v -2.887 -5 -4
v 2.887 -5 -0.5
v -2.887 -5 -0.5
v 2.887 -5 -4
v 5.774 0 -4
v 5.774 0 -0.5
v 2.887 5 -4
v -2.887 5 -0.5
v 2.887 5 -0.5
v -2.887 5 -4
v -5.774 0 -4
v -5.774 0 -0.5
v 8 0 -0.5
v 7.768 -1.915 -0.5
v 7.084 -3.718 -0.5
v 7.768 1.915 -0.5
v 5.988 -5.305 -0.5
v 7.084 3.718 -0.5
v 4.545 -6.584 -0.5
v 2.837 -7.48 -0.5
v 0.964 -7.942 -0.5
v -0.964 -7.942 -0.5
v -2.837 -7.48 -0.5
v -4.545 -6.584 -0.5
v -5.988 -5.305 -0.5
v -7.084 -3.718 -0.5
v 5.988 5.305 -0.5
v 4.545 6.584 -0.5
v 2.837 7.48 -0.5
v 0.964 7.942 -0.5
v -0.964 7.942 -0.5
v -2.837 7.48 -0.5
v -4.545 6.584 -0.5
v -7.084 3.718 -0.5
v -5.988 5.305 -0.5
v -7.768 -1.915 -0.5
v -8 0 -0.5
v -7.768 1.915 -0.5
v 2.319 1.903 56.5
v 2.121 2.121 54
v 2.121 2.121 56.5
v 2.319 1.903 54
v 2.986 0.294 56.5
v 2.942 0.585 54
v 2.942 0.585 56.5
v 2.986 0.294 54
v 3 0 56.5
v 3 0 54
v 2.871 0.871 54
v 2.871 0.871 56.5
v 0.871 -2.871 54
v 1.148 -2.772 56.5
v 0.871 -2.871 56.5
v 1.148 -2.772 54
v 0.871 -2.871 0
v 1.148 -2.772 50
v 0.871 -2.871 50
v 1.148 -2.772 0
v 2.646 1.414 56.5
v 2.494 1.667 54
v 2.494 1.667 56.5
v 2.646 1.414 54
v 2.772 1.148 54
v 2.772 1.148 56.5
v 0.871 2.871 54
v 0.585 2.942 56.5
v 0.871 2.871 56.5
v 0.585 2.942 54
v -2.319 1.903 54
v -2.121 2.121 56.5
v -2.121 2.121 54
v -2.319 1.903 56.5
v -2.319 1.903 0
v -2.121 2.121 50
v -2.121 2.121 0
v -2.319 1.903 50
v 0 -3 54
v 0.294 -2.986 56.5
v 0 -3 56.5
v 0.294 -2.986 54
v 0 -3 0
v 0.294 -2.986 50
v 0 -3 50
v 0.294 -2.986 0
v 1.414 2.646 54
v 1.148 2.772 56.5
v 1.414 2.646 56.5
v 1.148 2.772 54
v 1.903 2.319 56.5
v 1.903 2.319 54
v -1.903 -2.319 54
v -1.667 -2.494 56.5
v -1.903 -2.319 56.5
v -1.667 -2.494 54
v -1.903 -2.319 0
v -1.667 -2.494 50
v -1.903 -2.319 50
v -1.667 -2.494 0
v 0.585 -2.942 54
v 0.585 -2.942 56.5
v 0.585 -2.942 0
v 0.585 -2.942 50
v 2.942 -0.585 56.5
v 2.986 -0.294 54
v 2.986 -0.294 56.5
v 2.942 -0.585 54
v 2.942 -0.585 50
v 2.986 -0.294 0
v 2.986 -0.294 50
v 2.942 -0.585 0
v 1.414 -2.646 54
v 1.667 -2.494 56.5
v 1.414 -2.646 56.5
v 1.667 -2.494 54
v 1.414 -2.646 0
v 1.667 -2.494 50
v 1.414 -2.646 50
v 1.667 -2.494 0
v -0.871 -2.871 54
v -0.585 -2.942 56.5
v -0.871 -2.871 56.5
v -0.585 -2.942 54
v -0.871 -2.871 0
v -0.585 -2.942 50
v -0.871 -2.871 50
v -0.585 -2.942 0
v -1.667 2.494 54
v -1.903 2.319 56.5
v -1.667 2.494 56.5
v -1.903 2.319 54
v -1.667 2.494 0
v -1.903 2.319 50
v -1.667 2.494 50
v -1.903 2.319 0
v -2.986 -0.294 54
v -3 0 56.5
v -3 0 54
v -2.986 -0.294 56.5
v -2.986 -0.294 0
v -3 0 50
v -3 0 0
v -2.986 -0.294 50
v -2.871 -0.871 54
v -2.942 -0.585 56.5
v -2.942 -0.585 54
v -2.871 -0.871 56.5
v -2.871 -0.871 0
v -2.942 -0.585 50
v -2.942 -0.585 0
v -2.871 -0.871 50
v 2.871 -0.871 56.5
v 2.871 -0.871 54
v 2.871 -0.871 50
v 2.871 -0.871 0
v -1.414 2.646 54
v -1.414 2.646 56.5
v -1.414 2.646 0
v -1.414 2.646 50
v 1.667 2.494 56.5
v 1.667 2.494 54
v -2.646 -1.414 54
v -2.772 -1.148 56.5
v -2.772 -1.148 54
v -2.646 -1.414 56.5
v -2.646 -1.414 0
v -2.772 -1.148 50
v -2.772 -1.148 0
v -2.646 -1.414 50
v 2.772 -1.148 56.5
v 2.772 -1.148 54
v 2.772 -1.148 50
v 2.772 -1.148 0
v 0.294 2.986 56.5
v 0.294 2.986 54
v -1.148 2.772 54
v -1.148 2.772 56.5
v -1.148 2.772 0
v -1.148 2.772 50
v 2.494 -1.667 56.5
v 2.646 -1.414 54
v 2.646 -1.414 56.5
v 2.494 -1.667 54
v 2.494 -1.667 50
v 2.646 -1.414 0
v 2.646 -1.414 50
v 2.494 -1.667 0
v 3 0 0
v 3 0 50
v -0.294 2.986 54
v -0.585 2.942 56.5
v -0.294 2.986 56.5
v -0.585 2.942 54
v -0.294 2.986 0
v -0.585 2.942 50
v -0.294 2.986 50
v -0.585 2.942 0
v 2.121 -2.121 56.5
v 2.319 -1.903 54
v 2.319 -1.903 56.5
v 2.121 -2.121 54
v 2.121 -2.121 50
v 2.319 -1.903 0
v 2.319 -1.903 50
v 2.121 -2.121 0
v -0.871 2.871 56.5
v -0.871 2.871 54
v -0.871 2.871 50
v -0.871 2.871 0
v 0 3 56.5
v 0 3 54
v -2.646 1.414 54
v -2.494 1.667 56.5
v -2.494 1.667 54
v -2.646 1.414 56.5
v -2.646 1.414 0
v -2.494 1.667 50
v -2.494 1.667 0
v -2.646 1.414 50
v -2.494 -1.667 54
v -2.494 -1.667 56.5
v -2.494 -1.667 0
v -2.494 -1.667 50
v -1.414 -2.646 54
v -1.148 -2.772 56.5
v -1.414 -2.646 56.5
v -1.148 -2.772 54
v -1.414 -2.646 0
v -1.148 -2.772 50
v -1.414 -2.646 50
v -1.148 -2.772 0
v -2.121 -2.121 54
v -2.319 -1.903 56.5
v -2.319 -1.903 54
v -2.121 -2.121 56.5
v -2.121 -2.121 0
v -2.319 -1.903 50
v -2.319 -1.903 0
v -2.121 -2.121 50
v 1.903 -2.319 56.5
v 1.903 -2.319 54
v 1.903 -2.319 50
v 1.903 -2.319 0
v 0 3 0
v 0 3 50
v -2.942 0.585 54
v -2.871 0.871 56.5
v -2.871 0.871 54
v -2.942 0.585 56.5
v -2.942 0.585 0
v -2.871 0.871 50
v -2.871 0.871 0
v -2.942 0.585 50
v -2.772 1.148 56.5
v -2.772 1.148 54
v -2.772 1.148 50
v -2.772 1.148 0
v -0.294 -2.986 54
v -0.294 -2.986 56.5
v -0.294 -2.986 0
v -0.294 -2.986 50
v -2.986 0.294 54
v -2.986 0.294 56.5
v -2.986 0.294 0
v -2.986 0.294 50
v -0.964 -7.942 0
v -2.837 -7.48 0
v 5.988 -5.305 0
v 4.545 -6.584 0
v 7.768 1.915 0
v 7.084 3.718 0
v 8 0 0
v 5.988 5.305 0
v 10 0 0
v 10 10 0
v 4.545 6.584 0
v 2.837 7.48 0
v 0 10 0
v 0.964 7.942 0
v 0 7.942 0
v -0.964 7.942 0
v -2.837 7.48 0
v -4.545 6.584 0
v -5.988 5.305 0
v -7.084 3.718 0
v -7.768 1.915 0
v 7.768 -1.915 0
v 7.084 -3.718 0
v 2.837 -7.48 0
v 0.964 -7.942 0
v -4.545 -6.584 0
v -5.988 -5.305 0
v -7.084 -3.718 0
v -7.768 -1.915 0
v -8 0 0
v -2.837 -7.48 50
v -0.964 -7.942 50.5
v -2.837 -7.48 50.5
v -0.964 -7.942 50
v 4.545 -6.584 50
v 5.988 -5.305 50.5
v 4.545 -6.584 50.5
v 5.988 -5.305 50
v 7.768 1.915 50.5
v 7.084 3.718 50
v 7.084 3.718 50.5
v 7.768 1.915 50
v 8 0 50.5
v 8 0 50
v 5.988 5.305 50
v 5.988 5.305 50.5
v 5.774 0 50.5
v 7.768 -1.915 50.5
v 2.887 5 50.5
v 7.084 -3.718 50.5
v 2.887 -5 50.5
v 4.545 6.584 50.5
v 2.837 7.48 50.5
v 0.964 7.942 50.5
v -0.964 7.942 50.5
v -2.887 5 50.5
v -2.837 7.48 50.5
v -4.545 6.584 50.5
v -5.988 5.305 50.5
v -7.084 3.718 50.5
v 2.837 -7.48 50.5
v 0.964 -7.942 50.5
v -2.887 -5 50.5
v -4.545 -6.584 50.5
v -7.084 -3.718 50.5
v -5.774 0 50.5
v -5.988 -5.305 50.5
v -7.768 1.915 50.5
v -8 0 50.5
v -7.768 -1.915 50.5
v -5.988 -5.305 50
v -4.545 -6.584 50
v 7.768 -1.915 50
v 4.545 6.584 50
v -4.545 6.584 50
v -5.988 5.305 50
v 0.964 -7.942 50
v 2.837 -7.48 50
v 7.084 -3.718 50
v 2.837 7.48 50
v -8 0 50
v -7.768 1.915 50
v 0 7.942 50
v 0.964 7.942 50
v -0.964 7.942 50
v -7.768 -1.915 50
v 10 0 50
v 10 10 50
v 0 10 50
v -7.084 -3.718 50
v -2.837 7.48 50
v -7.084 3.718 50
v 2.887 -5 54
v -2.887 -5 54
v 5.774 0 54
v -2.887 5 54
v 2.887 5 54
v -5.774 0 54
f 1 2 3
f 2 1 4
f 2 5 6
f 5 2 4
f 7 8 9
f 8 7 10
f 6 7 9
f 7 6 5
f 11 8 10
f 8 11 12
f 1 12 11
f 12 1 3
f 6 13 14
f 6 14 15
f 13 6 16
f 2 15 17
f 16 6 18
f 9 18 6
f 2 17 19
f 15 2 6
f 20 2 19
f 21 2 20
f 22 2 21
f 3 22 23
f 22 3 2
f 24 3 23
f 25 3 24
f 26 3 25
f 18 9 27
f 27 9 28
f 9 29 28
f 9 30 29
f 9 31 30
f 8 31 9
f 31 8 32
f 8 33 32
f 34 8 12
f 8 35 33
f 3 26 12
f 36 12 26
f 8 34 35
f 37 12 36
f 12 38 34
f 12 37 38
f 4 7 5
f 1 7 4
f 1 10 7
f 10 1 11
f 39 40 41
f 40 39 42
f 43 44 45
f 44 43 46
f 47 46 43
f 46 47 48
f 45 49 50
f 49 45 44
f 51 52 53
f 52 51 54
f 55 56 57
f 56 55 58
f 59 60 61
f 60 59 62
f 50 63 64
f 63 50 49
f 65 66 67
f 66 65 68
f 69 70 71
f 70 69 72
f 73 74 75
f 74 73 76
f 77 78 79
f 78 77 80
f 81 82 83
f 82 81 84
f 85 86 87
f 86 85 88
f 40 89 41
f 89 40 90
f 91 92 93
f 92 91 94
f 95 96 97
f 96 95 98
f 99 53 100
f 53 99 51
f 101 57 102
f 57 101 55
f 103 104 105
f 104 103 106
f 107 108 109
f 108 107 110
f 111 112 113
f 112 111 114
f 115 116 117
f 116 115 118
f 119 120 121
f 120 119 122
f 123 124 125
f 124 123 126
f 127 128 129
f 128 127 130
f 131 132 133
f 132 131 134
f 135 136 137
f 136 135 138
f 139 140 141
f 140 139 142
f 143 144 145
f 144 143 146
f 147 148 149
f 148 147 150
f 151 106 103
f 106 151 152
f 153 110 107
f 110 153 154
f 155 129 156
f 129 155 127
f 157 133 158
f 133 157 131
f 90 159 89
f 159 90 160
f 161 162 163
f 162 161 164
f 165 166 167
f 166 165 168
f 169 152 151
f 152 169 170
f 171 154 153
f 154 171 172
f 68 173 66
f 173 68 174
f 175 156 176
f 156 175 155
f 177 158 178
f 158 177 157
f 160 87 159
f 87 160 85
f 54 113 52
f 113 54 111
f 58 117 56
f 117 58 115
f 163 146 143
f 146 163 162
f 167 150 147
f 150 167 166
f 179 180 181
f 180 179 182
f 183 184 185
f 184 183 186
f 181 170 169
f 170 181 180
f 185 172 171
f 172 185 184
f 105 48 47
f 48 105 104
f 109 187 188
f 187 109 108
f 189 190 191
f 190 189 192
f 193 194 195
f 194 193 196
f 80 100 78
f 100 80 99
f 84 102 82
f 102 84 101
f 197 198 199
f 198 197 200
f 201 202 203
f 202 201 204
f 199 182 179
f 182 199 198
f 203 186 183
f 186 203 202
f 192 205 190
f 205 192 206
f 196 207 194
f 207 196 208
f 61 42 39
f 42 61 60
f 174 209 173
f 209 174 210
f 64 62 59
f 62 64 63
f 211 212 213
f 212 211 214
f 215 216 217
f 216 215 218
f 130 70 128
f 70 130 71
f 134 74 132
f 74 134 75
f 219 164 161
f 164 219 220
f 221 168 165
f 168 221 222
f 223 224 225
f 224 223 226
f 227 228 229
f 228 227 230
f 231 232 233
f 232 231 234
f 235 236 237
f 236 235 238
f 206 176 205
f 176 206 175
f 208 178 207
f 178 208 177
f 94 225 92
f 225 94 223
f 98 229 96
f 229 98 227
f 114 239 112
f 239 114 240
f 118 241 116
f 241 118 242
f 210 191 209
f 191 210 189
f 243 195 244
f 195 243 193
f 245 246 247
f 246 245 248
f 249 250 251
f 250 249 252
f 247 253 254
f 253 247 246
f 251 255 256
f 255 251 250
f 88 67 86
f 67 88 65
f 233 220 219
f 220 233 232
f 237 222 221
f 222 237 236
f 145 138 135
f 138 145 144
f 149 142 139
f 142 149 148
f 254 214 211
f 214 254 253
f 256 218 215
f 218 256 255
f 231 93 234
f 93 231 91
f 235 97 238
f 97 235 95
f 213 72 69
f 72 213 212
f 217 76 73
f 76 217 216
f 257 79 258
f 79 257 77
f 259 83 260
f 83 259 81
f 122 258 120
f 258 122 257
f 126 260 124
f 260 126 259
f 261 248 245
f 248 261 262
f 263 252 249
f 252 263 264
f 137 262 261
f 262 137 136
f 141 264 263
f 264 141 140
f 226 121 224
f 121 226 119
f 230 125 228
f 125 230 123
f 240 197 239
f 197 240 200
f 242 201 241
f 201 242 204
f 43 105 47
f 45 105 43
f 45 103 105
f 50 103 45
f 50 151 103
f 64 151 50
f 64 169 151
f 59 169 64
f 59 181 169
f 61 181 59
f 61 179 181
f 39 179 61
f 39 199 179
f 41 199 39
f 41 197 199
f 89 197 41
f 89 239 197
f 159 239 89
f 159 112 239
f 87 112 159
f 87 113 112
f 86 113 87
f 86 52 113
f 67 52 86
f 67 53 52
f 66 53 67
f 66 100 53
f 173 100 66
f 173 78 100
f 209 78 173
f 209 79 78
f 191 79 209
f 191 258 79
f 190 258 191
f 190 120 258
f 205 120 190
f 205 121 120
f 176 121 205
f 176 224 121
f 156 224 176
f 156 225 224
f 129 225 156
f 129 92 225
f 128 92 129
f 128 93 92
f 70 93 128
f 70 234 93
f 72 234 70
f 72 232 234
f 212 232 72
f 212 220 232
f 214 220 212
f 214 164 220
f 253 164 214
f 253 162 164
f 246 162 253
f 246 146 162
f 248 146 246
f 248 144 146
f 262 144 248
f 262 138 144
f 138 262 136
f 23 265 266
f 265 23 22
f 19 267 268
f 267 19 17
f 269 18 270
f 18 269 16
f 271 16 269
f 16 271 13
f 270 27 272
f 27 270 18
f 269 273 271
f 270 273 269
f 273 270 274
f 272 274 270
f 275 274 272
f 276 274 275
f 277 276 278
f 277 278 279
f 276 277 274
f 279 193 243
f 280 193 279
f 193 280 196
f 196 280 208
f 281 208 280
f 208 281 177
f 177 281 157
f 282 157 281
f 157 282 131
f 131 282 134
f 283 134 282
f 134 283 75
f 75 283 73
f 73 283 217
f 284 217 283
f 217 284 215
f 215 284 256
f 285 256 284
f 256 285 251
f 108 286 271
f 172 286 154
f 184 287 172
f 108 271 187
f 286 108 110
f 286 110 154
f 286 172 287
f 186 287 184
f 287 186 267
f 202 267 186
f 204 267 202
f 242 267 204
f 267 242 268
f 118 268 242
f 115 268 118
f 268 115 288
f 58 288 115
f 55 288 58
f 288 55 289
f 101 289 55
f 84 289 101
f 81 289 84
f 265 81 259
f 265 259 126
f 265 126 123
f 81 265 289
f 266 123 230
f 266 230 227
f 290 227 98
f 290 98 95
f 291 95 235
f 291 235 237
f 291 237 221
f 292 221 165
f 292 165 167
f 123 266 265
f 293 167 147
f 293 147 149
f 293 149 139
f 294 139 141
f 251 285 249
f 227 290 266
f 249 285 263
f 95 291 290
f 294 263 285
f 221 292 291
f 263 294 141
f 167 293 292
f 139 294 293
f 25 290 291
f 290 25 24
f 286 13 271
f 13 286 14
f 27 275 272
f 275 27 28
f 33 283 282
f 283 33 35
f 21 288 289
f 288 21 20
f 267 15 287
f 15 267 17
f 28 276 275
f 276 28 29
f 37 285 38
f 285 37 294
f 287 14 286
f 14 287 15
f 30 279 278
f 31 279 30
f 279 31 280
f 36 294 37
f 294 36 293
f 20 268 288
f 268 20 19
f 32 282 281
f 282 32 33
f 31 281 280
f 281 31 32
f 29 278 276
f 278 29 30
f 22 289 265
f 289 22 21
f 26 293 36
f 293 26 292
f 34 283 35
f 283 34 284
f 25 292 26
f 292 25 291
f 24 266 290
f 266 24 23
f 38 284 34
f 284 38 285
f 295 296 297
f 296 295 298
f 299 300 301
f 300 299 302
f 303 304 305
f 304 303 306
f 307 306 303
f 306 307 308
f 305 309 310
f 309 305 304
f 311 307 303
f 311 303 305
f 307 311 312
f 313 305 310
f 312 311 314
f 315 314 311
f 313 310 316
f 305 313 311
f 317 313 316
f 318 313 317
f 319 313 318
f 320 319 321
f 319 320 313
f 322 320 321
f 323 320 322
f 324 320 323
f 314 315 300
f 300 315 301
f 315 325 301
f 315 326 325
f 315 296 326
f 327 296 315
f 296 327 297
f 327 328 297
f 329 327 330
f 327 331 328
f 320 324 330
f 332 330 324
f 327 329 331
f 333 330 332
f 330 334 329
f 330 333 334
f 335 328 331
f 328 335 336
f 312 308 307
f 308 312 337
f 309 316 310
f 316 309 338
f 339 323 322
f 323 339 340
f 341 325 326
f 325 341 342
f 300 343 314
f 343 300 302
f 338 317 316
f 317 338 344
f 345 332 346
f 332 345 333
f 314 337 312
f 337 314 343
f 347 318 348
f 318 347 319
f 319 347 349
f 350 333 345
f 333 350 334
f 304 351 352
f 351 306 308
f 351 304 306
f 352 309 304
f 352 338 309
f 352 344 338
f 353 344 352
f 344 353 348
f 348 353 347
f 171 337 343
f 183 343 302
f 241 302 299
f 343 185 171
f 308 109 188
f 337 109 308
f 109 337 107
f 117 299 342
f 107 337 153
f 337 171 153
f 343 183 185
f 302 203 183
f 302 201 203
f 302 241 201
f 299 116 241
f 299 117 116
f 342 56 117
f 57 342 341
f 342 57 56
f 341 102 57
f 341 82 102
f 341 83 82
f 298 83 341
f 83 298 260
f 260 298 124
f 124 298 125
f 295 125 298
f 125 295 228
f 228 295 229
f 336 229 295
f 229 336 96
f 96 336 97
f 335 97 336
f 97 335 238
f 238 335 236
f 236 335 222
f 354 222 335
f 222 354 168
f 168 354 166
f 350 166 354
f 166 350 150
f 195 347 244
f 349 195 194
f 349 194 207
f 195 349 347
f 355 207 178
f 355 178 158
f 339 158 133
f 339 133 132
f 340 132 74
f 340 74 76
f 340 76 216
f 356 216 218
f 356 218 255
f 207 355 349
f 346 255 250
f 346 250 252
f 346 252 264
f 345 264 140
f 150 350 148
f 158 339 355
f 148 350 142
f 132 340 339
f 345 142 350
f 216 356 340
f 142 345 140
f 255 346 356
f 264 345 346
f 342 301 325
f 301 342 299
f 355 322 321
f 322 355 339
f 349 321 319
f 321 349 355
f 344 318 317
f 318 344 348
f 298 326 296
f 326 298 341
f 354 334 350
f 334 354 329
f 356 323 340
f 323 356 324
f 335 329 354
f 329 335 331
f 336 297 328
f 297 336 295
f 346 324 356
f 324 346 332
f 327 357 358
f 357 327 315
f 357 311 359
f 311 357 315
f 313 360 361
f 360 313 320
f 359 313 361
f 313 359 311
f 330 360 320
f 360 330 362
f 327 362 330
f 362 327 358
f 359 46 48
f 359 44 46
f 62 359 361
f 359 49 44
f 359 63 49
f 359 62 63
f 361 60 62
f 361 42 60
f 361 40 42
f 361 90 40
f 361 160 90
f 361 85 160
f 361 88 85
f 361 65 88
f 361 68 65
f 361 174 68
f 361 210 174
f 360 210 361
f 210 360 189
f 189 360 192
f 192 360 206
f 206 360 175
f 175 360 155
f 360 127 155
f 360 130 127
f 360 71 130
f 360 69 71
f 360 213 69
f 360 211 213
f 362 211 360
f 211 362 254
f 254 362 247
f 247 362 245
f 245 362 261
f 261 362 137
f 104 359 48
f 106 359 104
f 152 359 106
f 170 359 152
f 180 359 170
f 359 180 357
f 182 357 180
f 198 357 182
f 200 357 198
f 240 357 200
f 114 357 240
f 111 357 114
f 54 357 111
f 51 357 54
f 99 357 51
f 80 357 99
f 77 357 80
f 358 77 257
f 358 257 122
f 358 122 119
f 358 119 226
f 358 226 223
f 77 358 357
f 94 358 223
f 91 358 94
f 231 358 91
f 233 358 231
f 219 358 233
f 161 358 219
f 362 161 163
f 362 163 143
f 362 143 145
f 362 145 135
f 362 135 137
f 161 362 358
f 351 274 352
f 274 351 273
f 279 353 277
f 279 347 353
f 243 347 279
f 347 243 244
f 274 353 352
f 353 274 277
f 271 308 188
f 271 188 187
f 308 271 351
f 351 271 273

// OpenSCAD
_SuperTight = 0.4;
_Tight = 0.6;
_Loose = 1.0;

BoltWashersAndNut(10,3.5,16,0.5,6,50);
cube([10,10,50]);


module M3Loose(length, center=false)
{
    cylinder(d=3 + _Loose, h=length, $fn=64, center=center);
}

module M3Tight(length, center=false)
{
    cylinder(d=3 + _Tight, h=length, $fn=64, center=center);
}

module M3SuperTight(length, center=false)
{
    cylinder(d=3 + _SuperTight, h=length, $fn=64, center=center);
}

module M4Loose(length, center=false)
{
    cylinder(d=4 + _Loose, h=length, $fn=64, center=center);
}

module M4Tight(length, center=false)
{
    cylinder(d=4 + _Tight, h=length, $fn=64, center=center);
}

module M4SuperTight(length, center=false)
{
    cylinder(d=4 + _SuperTight, h=length, $fn=64, center=center);
}

module M5Loose(length, center=false)
{
    cylinder(d=5 + _Loose, h=length, $fn=64, center=center);
}

module M5Tight(length, center=false)
{
    cylinder(d=5 + _Tight, h=length, $fn=64, center=center);
}

module M5SuperTight(length, center=false)
{
    cylinder(d=5 + _SuperTight, h=length, $fn=64, center=center);
}


module M6Loose(length, center=false)
{
    cylinder(d=6 + _Loose, h=length, $fn=64, center=center);
}

module M6Tight(length, center=false)
{
    cylinder(d=6 + _Tight, h=length, $fn=64, center=center);
}

module M6SuperTight(length, center=false)
{
    cylinder(d=6 + _SuperTight, h=length, $fn=64, center=center);
}

module M8Loose(length, center=false)
{
    cylinder(d=8 + _Loose, h=length, $fn=64, center=center);
}

module M8Tight(length, center=false)
{
    cylinder(d=8 + _Tight, h=length, $fn=64, center=center);
}

module M8SuperTight(length, center=false)
{
    cylinder(d=8 + _SuperTight, h=length, $fn=64, center=center);
}

module M10Loose(length, center=false)
{
    cylinder(d=10 + _Loose, h=length, $fn=64, center=center);
}

module M10Tight(length, center=false)
{
    cylinder(d=10 + _Tight, h=length, $fn=64, center=center);
}

module M10SuperTight(length, center=false)
{
    cylinder(d=10 + _SuperTight, h=length, $fn=64, center=center);
}

module M3SquareNut(center=false)
{
    if(center)
    {
        cube([5.8,5.8,2.8], center=true);
    }
    else
    {
        translate([0,0,1.4])
        cube([5.8,5.8,2.8], center=true);
    }
}

module M3Nut(center = false)
{
    Hexagon(5.5+_Tight,2.4, center);
}

module M4Nut(center = false)
{
    Hexagon(7+_Tight,3.2,center);
}

module M5Nut(center = false)
{
    Hexagon(8+_Tight,4,center);
}

module M6Nut(center = false)
{
    Hexagon(10+_Tight,5,center); 
}

module M8Nut(center = false)
{
    Hexagon(13+_Tight,6.5,center);
}

module M10Nut(center = false)
{
    Hexagon(17+_Tight,8,center);
}


module Washer(Diameter, Width)
{
	cylinder(d=Diameter,h=Width);	
}

module Hexagon(width, height, center=false)
{
	cylinder(d=width*1.15473,h=height,$fn=6, center=center);
}

module HexBolt(HeadWidth, HeadHeight, Diameter, Length)
{
	translate([0,0,-HeadHeight])
	Hexagon(HeadWidth, HeadHeight);
	cylinder(d=Diameter,h=Length,$fn=64);
}

module BoltWashersAndNut(	HeadWidth,
                            HeadHeight,
                            WasherDiameter,
                            WasherWidth,
                            Diameter,
                            Span	)
{
	union()
	{
		translate([0,0,-WasherWidth])
		Washer(WasherDiameter, WasherWidth);
		translate([0,0,-WasherWidth])
		HexBolt(HeadWidth, HeadHeight, Diameter, Span + 2*HeadHeight);
		translate([0,0,Span])
		Washer(WasherDiameter, WasherWidth);
		translate([0,0,Span + WasherWidth])
		Hexagon(HeadWidth,HeadHeight);
	}
}
